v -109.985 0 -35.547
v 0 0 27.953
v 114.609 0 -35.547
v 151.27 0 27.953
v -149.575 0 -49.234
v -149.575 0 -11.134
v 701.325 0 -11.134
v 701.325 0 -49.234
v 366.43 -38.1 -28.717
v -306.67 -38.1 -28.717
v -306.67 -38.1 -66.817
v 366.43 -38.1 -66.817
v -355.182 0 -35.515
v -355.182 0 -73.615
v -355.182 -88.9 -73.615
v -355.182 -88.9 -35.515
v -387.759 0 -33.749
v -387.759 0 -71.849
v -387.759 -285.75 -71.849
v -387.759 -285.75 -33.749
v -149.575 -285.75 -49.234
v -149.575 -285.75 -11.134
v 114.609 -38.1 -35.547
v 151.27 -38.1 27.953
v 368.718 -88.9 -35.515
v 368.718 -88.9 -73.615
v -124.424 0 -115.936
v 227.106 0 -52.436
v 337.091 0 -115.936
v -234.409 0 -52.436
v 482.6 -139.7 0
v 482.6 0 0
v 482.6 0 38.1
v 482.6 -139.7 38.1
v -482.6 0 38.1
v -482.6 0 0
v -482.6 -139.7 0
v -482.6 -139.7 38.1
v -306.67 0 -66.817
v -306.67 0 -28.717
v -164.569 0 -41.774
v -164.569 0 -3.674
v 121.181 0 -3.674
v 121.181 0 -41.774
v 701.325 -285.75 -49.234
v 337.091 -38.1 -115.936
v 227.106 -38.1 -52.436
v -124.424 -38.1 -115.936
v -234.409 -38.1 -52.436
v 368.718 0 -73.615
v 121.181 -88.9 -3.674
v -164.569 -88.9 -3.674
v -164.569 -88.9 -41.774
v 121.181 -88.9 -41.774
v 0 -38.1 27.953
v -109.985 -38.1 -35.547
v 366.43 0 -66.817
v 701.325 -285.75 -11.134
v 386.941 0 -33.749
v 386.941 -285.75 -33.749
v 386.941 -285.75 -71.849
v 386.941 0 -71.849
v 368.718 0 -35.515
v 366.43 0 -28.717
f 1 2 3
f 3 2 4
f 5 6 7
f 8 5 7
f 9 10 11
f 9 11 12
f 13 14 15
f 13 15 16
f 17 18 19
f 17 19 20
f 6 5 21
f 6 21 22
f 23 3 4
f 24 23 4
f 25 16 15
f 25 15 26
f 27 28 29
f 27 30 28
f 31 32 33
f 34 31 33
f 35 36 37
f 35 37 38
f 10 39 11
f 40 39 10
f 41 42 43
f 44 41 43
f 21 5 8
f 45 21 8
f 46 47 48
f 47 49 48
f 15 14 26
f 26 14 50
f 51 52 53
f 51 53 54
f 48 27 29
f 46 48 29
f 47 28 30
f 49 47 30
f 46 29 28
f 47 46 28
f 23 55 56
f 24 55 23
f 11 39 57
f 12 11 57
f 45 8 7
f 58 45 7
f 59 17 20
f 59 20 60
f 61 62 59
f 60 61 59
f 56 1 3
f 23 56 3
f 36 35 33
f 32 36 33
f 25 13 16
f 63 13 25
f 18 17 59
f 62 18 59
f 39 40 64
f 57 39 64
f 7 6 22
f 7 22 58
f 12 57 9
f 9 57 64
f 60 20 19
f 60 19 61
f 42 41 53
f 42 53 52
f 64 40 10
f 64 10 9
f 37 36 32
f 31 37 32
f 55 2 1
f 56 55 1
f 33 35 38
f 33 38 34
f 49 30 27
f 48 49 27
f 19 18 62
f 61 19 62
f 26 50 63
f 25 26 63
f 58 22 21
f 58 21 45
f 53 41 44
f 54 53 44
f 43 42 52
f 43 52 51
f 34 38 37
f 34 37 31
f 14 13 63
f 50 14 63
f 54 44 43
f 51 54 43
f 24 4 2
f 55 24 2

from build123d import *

# Parameters (mm, degrees)
F0_W      = 965.2
F0_H      = 38.1
F1_DEPTH  = 139.7
F10_W     = 723.9
F10_H     = 38.1
F11_DEPTH = 88.9
F12_W     = 850.9
F12_H     = 38.1
F13_DEPTH = 285.75
F14_W     = 774.7
F14_H     = 38.1
F15_DEPTH = 285.75
F16_W     = 285.75
F16_H     = 38.1
F17_DEPTH = 88.9
F18_W     = 673.1
F18_H     = 38.1
F19_DEPTH = 38.1
F21_DEPTH = 38.1
F25_DEPTH = 38.1


with BuildPart() as f1:
    # F0 (on Front) → F1 (new body)
    with BuildSketch(Plane.XZ):
        with Locations((0, 19.05)):
            Rectangle(F0_W, F0_H)
    extrude(amount=F1_DEPTH)


with BuildPart() as f2_1:
    # F2: copy of F1
    add(f1.part)


with BuildPart() as f4_1:
    # F4: copy of F1
    add(f1.part)


with BuildPart() as f5_1:
    # F5: copy of F4_1
    add(f4_1.part)


with BuildPart() as f6_1:
    # F6: copy of F5_1
    add(f5_1.part)


with BuildPart() as f11:
    # F10 (on Front) → F11 (new body)
    with BuildSketch(Plane.XZ):
        with Locations((6.767765, -54.564733)):
            Rectangle(F10_W, F10_H)
    extrude(amount=F11_DEPTH)


with BuildPart() as f13:
    # F12 (on Front) → F13 (new body)
    with BuildSketch(Plane.XZ):
        with Locations((275.874885, -30.183716)):
            Rectangle(F12_W, F12_H)
    extrude(amount=F13_DEPTH)


with BuildPart() as f15:
    # F14 (on Front) → F15 (new body)
    with BuildSketch(Plane.XZ):
        with Locations((-0.409301, -52.799448)):
            Rectangle(F14_W, F14_H)
    extrude(amount=F15_DEPTH)


with BuildPart() as f17:
    # F16 (on Front) → F17 (new body)
    with BuildSketch(Plane.XZ):
        with Locations((-21.693762, -22.723508)):
            Rectangle(F16_W, F16_H)
    extrude(amount=F17_DEPTH)


with BuildPart() as f19:
    # F18 (on Front) → F19 (new body)
    with BuildSketch(Plane.XZ):
        with Locations((29.880106, -47.766945)):
            Rectangle(F18_W, F18_H)
    extrude(amount=F19_DEPTH)


with BuildPart() as f21:
    # F20 (on Front) → F21 (new body)
    with BuildSketch(Plane.XZ):
        Polygon((0, 27.952793), (-109.985226, -35.547207), (114.608608, -35.547207), (151.27035, 27.952793), align=None)
    extrude(amount=F21_DEPTH)


with BuildPart() as f22_1:
    # F22: copy of F21
    add(f21.part)


with BuildPart() as f25:
    # F24 (on Front) → F25 (new body)
    with BuildSketch(Plane.XZ):
        Polygon((-124.423885, -115.936463), (337.090889, -115.936463), (227.105663, -52.436463), (-234.409111, -52.436463), align=None)
    extrude(amount=F25_DEPTH)


solid = Compound([f1.part, f11.part, f13.part, f15.part, f17.part, f19.part, f22_1.part, f25.part])
